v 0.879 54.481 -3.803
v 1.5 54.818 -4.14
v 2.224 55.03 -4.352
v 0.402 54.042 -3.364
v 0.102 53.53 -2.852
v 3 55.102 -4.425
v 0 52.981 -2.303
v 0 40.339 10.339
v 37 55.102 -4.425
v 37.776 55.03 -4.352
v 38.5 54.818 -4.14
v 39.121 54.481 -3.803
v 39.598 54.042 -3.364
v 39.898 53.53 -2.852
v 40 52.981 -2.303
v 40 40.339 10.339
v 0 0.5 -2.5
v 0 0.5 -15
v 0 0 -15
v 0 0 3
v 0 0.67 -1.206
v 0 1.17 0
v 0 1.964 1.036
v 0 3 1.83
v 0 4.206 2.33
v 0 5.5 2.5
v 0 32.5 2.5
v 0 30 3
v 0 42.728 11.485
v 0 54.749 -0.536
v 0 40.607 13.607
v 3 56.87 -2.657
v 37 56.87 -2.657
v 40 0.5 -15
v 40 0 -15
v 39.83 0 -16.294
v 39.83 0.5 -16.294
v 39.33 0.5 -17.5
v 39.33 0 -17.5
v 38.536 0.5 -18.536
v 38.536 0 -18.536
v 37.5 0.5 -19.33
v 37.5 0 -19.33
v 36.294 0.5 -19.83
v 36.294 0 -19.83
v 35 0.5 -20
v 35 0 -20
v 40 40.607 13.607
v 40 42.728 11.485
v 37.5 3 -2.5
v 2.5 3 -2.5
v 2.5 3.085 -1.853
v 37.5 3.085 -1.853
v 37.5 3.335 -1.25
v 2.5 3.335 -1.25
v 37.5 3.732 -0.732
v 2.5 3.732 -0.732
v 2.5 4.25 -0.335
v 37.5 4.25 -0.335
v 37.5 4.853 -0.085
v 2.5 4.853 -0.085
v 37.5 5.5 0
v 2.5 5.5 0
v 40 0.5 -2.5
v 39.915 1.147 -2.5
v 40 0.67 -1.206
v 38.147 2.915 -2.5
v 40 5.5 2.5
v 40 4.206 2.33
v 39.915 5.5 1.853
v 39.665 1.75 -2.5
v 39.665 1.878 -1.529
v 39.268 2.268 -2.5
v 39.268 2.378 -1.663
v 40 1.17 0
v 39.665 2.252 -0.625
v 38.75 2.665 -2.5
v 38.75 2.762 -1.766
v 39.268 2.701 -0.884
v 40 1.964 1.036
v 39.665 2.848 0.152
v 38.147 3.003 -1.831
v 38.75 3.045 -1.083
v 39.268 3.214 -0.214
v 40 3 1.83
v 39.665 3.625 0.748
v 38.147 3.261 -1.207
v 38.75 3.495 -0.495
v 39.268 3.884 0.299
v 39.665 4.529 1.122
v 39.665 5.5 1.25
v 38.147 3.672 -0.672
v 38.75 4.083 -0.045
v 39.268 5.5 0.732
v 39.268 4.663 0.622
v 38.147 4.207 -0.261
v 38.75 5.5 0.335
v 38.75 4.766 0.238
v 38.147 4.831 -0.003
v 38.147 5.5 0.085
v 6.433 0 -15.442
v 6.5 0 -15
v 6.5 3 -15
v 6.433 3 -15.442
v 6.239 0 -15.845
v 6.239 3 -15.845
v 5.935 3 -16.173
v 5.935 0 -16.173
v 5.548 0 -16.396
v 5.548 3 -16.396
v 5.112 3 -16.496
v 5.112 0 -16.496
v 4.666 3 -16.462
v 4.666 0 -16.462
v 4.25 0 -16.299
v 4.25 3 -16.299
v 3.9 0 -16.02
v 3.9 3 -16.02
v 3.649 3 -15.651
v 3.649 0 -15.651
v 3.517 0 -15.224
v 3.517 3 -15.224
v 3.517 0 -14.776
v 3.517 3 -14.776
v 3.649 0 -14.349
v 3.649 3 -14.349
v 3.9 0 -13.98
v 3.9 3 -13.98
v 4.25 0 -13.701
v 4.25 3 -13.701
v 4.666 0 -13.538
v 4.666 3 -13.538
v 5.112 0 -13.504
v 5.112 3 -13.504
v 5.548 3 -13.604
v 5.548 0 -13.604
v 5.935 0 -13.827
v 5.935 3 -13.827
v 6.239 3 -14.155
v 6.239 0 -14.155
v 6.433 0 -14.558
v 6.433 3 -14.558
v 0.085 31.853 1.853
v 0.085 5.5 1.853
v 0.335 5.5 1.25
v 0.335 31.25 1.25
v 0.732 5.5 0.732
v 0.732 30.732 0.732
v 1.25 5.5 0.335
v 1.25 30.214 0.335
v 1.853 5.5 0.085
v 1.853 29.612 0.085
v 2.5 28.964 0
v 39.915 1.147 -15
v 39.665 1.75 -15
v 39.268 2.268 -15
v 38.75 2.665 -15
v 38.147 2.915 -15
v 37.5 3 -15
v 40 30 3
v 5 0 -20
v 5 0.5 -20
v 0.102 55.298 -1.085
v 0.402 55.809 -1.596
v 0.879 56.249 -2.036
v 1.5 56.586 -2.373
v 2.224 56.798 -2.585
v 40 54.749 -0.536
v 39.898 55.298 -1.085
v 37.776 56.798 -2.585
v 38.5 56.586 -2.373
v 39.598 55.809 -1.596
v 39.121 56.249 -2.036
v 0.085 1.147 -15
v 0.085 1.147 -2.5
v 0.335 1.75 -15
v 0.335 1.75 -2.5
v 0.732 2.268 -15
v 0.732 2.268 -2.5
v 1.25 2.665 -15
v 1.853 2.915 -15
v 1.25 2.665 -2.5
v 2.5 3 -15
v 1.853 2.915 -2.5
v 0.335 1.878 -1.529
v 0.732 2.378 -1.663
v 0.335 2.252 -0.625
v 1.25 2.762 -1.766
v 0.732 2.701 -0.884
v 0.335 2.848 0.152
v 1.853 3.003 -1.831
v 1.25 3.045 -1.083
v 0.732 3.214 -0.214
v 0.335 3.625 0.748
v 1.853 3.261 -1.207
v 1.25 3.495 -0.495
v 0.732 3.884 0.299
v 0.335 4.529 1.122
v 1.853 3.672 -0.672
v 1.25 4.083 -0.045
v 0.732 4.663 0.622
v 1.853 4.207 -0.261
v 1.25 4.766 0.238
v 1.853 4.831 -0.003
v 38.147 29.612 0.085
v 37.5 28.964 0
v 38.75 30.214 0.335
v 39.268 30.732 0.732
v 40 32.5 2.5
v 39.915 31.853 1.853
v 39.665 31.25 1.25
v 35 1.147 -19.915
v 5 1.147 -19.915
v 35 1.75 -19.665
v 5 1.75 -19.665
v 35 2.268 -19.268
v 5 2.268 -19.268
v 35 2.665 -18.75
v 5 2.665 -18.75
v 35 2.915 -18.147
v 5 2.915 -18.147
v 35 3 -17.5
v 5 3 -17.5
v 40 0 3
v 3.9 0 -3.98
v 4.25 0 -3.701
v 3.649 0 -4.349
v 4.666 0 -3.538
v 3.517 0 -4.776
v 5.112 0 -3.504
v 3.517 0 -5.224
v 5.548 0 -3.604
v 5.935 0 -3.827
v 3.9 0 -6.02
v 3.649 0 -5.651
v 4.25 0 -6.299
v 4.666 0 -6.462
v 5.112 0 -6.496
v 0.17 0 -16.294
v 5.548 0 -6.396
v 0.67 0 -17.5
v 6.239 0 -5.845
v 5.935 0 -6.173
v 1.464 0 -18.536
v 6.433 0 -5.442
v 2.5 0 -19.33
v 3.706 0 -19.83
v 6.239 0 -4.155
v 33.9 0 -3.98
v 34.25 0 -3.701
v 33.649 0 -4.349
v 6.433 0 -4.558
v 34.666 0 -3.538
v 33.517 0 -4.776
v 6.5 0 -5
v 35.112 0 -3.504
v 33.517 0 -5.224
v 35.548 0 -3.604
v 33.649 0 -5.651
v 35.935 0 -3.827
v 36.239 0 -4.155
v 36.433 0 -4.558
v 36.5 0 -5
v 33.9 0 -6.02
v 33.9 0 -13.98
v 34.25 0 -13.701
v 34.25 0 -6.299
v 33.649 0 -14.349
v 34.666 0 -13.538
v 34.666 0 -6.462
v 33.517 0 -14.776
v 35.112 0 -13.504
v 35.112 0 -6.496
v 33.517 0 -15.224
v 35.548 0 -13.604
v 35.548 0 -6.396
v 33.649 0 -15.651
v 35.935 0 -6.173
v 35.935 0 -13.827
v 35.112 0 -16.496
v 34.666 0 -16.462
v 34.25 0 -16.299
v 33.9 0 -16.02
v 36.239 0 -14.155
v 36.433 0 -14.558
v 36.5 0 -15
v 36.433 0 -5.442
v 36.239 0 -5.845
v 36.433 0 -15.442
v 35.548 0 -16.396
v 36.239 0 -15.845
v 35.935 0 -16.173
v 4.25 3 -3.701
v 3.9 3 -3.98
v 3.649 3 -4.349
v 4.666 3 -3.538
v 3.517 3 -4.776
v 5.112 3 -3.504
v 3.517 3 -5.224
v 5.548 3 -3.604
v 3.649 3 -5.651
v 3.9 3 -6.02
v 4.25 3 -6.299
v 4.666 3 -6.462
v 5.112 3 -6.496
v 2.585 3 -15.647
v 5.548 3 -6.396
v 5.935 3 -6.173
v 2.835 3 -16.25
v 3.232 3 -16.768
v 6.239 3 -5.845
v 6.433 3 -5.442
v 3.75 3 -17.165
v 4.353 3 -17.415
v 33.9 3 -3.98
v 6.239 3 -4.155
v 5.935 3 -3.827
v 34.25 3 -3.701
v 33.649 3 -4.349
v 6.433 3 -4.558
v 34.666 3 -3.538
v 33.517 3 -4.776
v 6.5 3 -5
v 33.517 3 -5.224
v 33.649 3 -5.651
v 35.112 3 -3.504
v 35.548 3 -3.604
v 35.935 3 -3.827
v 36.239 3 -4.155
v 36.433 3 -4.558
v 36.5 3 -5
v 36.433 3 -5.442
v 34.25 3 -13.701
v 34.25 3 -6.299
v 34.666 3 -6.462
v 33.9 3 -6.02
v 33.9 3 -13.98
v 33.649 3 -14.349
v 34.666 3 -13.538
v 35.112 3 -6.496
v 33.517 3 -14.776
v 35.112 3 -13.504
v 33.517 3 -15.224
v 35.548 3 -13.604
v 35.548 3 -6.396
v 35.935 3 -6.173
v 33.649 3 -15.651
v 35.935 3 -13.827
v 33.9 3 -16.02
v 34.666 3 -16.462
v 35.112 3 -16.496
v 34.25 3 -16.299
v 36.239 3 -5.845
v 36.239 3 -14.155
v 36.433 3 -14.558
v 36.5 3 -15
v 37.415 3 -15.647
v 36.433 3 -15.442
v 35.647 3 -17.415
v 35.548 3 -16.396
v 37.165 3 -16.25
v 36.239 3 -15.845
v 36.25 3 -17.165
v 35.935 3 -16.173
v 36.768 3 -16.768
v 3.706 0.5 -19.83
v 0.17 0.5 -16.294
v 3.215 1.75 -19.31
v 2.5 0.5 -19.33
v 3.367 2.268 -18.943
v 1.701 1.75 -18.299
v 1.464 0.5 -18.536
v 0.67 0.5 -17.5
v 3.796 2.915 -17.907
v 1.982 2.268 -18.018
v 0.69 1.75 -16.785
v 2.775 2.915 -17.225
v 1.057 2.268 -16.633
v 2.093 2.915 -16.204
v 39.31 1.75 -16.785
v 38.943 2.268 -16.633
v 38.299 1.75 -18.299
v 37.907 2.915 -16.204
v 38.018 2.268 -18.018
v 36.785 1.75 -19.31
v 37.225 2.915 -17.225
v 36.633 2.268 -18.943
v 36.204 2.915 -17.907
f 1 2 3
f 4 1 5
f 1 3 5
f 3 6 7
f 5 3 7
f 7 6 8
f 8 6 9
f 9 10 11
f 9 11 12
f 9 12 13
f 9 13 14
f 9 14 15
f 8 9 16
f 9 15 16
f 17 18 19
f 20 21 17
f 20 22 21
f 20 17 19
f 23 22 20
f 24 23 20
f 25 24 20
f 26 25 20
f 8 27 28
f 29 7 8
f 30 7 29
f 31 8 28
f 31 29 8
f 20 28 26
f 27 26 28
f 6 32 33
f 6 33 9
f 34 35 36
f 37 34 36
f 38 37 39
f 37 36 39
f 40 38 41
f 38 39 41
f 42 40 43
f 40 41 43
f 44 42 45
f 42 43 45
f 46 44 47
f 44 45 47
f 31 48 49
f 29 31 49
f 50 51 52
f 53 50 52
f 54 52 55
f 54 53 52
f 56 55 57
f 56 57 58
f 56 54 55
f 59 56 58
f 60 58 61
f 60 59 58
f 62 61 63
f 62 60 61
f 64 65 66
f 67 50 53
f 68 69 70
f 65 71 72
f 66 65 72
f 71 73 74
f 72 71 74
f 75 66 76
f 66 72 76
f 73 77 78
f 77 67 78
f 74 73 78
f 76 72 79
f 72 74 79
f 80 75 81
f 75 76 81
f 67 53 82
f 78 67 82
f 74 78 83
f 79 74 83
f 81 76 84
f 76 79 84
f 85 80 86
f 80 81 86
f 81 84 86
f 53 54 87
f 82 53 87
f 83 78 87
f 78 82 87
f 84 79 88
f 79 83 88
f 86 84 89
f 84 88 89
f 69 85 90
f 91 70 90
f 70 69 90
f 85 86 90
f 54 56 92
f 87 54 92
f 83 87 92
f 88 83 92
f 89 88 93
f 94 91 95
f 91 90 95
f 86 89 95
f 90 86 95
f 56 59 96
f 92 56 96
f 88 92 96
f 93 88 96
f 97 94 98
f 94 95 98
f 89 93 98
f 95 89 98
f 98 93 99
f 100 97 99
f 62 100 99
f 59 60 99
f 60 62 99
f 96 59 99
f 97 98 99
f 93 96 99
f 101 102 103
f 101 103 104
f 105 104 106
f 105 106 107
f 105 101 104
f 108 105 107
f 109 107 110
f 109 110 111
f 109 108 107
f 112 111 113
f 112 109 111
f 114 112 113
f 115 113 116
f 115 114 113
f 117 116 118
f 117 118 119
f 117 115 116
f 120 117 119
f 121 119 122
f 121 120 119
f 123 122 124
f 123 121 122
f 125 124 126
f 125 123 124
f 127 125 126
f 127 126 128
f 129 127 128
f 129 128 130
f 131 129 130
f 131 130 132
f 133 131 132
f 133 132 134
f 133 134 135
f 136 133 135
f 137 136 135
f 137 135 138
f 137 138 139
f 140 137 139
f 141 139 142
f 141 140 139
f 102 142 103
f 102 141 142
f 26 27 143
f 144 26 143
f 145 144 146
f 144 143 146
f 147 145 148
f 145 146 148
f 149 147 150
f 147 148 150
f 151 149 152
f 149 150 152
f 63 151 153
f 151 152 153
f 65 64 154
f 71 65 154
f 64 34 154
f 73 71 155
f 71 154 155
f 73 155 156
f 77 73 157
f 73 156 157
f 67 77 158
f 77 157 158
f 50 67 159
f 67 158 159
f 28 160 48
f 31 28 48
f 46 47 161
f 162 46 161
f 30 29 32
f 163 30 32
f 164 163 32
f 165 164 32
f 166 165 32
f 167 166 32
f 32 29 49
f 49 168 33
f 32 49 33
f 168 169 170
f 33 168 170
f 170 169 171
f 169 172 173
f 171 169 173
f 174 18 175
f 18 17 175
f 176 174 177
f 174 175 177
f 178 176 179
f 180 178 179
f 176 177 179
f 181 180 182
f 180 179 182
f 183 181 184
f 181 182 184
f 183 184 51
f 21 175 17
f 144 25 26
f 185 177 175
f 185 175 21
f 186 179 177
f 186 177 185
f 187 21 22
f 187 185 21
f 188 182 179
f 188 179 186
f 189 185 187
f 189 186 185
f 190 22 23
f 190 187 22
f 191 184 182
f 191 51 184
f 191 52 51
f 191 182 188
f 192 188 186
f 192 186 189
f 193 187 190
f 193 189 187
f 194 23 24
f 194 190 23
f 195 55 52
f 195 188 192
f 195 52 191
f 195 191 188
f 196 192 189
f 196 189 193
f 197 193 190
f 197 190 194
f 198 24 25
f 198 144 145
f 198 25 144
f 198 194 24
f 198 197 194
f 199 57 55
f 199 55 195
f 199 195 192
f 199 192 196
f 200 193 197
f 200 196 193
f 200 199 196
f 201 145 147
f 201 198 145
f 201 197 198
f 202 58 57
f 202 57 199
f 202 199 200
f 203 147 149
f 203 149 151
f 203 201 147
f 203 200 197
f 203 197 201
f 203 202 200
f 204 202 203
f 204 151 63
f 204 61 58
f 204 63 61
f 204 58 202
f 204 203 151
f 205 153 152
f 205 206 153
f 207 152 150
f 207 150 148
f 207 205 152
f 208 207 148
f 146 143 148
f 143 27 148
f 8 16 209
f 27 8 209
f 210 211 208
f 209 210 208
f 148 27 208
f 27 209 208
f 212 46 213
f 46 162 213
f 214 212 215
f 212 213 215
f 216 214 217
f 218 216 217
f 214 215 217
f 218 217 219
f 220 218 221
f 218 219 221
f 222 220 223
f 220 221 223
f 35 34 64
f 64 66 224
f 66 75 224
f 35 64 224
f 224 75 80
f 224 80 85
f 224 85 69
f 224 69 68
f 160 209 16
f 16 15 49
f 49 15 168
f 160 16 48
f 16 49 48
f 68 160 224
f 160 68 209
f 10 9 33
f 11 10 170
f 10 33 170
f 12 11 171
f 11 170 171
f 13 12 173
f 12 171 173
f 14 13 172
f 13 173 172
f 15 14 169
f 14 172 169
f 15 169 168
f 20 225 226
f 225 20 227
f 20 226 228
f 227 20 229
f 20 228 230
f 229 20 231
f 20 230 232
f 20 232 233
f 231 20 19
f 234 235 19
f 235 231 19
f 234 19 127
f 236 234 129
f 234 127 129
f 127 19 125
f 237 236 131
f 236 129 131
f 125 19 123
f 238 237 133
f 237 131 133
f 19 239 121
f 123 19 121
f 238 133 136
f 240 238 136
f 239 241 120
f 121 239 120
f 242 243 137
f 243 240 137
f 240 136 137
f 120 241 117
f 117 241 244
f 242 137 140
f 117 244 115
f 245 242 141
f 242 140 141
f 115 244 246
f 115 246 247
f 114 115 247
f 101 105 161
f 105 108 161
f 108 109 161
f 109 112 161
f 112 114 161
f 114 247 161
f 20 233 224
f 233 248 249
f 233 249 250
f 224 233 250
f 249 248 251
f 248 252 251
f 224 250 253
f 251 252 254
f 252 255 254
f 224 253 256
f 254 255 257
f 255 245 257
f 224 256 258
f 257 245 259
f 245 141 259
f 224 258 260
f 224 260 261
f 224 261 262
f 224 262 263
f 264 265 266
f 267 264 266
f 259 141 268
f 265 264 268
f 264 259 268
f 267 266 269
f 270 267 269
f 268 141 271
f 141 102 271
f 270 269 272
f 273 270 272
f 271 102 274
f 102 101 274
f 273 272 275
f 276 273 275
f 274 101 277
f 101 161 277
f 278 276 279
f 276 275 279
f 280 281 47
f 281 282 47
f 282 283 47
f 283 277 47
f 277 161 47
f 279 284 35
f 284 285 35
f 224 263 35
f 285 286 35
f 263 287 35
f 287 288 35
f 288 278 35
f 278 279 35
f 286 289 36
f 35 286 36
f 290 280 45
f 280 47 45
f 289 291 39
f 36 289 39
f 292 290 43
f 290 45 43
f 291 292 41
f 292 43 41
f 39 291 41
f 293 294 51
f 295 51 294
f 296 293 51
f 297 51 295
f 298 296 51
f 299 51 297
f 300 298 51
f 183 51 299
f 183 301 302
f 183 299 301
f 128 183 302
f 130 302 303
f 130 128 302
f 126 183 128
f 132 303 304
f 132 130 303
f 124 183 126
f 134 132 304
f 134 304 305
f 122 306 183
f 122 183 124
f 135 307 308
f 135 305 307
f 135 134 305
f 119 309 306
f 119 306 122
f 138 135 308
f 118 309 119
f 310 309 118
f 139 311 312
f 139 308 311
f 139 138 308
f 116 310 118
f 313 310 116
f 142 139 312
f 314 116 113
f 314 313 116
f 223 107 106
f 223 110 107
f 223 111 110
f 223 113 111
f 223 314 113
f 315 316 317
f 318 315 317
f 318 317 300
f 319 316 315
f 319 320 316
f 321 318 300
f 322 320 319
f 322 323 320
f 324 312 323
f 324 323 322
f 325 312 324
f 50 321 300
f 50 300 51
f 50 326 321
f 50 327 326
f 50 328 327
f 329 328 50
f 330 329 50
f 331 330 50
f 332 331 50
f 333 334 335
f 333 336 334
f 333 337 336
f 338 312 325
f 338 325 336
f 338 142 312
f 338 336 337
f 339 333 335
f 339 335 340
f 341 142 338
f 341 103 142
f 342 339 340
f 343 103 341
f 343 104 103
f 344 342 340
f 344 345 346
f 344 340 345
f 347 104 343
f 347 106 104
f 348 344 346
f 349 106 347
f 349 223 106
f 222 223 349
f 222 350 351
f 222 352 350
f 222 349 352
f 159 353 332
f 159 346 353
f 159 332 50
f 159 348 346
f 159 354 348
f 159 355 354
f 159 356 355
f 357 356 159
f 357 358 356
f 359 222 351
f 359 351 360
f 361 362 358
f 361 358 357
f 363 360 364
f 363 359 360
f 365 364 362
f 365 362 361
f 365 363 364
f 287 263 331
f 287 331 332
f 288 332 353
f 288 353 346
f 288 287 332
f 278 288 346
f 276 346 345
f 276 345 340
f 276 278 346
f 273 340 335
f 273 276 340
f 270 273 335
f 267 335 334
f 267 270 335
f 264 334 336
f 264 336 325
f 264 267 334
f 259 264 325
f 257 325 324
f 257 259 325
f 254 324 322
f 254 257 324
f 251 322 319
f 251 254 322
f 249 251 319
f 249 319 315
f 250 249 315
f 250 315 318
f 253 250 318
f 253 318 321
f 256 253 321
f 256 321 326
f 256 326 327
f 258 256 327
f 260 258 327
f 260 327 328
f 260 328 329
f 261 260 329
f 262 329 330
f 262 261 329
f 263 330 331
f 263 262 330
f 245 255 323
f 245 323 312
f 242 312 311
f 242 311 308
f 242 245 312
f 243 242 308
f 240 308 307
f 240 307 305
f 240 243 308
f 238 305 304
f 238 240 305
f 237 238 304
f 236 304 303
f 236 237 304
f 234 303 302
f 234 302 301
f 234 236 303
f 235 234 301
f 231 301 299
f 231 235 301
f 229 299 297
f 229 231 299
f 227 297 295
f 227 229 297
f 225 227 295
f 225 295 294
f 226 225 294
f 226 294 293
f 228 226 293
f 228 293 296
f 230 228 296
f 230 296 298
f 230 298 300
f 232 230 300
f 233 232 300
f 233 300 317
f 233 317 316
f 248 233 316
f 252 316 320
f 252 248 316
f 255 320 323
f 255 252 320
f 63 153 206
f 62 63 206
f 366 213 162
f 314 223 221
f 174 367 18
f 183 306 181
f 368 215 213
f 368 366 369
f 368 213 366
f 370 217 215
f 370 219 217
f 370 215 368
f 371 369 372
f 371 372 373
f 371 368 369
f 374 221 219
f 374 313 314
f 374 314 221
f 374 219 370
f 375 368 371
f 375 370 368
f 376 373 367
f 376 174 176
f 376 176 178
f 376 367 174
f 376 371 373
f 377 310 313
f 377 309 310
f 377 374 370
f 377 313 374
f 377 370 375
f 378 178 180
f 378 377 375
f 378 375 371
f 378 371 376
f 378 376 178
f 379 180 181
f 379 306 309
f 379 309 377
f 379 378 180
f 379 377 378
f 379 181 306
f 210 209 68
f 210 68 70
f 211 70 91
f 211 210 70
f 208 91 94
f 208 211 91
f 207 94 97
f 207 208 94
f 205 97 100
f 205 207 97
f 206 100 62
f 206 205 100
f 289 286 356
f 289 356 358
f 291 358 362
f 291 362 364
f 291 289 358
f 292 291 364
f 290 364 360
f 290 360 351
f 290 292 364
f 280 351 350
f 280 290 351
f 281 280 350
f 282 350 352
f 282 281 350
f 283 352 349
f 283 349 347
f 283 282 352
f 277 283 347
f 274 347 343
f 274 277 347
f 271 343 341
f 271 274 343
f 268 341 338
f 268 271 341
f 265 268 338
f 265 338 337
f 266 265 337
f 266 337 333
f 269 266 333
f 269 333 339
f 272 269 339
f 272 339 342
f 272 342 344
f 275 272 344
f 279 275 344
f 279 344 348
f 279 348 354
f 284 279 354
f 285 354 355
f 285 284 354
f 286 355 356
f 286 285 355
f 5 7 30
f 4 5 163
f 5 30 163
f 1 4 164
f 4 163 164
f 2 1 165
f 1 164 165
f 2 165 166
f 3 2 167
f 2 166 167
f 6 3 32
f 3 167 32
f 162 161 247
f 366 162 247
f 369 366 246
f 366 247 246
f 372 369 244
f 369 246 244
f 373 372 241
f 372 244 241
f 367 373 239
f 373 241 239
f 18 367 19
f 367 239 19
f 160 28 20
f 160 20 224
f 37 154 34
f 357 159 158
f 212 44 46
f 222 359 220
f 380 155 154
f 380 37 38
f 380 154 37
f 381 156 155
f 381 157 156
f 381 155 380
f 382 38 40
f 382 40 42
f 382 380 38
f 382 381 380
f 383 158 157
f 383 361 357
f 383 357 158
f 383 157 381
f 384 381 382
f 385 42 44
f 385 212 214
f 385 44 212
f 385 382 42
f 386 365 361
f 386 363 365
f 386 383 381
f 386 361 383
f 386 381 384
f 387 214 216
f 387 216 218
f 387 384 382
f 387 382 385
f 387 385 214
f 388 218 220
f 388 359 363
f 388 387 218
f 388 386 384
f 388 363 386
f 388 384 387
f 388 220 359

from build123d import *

# Parameters (mm, degrees)
SKETCH1_R           = 1.5
BOSS_EXTRUDE1_DEPTH = 3
SKETCH2_W           = 40
SKETCH2_H           = 30
BOSS_EXTRUDE2_DEPTH = 3
BOSS_EXTRUDE3_DEPTH = 40
CUT_EXTRUDE1_DEPTH  = 3
FILLET2_R           = 2.5


with BuildPart() as part:
    # Sketch1 → Boss-Extrude1 (new body)
    with BuildSketch(Plane(origin=(0, 0, 0), x_dir=(1, 0, 0), z_dir=(0, 1, 0))):
        with BuildLine():
            Line((40, 0), (40, 15))
            ThreePointArc((40, 15), (38.535533906, 18.535533906), (35, 20))
            Line((35, 20), (5, 20))
            ThreePointArc((5, 20), (1.464466094, 18.535533906), (0, 15))
            Line((0, 15), (0, 0))
            Line((0, 0), (40, 0))
        make_face()
        with Locations((5, 15)):
            Circle(SKETCH1_R, mode=Mode.SUBTRACT)
        with Locations((5, 5)):
            Circle(SKETCH1_R, mode=Mode.SUBTRACT)
        with Locations((35, 15)):
            Circle(SKETCH1_R, mode=Mode.SUBTRACT)
        with Locations((35, 5)):
            Circle(SKETCH1_R, mode=Mode.SUBTRACT)
    extrude(amount=BOSS_EXTRUDE1_DEPTH)

    # Sketch2 → Boss-Extrude2 (add)
    with BuildSketch(Plane.XY):
        with Locations((20, 15)):
            Rectangle(SKETCH2_W, SKETCH2_H)
    extrude(amount=BOSS_EXTRUDE2_DEPTH)

    # Sketch3 → Boss-Extrude3 (add)
    with BuildSketch(Plane(origin=(40, 0, 0), x_dir=(0, 0, -1), z_dir=(1, 0, 0))):
        Polygon((-3, 30), (-13.606601718, 40.606601718), (-11.485281374, 42.727922061), (2.656854249, 56.870057685), (4.424621202, 55.102290732), (-10.338834765, 40.338834765), (0, 30), align=None)
    extrude(amount=-BOSS_EXTRUDE3_DEPTH)

    # Sketch4 → Cut-Extrude1 (cut)
    with BuildSketch(Plane(origin=(0, 27.106601718, 27.106601718), x_dir=(1, 0, 0), z_dir=(0, 0.707106781, 0.707106781))):
        with BuildLine():
            Line((3, 42.091883092), (0, 42.091883092))
            Line((0, 42.091883092), (0, 39.091883092))
            ThreePointArc((0, 39.091883092), (0.878679656, 41.213203436), (3, 42.091883092))
        make_face()
        with BuildLine():
            Line((40, 42.091883092), (37, 42.091883092))
            ThreePointArc((37, 42.091883092), (39.121320344, 41.213203436), (40, 39.091883092))
            Line((40, 39.091883092), (40, 42.091883092))
        make_face()
    extrude(amount=-CUT_EXTRUDE1_DEPTH, mode=Mode.SUBTRACT)

    # Fillet2
    fillet2_edges = [part.edges().sort_by_distance(p)[0] for p in [
        (40, 3, -7.5),
        (38.535533906, 3, -18.535533906),
        (20, 3, -20),
        (1.464466094, 3, -18.535533906),
        (0, 16.5, 0),
        (40, 16.5, 0),
        (20, 30, 0),
        (0, 3, -7.5),
        (20, 3, 0),
    ]]
    fillet(fillet2_edges, radius=FILLET2_R)


solid = part.part
